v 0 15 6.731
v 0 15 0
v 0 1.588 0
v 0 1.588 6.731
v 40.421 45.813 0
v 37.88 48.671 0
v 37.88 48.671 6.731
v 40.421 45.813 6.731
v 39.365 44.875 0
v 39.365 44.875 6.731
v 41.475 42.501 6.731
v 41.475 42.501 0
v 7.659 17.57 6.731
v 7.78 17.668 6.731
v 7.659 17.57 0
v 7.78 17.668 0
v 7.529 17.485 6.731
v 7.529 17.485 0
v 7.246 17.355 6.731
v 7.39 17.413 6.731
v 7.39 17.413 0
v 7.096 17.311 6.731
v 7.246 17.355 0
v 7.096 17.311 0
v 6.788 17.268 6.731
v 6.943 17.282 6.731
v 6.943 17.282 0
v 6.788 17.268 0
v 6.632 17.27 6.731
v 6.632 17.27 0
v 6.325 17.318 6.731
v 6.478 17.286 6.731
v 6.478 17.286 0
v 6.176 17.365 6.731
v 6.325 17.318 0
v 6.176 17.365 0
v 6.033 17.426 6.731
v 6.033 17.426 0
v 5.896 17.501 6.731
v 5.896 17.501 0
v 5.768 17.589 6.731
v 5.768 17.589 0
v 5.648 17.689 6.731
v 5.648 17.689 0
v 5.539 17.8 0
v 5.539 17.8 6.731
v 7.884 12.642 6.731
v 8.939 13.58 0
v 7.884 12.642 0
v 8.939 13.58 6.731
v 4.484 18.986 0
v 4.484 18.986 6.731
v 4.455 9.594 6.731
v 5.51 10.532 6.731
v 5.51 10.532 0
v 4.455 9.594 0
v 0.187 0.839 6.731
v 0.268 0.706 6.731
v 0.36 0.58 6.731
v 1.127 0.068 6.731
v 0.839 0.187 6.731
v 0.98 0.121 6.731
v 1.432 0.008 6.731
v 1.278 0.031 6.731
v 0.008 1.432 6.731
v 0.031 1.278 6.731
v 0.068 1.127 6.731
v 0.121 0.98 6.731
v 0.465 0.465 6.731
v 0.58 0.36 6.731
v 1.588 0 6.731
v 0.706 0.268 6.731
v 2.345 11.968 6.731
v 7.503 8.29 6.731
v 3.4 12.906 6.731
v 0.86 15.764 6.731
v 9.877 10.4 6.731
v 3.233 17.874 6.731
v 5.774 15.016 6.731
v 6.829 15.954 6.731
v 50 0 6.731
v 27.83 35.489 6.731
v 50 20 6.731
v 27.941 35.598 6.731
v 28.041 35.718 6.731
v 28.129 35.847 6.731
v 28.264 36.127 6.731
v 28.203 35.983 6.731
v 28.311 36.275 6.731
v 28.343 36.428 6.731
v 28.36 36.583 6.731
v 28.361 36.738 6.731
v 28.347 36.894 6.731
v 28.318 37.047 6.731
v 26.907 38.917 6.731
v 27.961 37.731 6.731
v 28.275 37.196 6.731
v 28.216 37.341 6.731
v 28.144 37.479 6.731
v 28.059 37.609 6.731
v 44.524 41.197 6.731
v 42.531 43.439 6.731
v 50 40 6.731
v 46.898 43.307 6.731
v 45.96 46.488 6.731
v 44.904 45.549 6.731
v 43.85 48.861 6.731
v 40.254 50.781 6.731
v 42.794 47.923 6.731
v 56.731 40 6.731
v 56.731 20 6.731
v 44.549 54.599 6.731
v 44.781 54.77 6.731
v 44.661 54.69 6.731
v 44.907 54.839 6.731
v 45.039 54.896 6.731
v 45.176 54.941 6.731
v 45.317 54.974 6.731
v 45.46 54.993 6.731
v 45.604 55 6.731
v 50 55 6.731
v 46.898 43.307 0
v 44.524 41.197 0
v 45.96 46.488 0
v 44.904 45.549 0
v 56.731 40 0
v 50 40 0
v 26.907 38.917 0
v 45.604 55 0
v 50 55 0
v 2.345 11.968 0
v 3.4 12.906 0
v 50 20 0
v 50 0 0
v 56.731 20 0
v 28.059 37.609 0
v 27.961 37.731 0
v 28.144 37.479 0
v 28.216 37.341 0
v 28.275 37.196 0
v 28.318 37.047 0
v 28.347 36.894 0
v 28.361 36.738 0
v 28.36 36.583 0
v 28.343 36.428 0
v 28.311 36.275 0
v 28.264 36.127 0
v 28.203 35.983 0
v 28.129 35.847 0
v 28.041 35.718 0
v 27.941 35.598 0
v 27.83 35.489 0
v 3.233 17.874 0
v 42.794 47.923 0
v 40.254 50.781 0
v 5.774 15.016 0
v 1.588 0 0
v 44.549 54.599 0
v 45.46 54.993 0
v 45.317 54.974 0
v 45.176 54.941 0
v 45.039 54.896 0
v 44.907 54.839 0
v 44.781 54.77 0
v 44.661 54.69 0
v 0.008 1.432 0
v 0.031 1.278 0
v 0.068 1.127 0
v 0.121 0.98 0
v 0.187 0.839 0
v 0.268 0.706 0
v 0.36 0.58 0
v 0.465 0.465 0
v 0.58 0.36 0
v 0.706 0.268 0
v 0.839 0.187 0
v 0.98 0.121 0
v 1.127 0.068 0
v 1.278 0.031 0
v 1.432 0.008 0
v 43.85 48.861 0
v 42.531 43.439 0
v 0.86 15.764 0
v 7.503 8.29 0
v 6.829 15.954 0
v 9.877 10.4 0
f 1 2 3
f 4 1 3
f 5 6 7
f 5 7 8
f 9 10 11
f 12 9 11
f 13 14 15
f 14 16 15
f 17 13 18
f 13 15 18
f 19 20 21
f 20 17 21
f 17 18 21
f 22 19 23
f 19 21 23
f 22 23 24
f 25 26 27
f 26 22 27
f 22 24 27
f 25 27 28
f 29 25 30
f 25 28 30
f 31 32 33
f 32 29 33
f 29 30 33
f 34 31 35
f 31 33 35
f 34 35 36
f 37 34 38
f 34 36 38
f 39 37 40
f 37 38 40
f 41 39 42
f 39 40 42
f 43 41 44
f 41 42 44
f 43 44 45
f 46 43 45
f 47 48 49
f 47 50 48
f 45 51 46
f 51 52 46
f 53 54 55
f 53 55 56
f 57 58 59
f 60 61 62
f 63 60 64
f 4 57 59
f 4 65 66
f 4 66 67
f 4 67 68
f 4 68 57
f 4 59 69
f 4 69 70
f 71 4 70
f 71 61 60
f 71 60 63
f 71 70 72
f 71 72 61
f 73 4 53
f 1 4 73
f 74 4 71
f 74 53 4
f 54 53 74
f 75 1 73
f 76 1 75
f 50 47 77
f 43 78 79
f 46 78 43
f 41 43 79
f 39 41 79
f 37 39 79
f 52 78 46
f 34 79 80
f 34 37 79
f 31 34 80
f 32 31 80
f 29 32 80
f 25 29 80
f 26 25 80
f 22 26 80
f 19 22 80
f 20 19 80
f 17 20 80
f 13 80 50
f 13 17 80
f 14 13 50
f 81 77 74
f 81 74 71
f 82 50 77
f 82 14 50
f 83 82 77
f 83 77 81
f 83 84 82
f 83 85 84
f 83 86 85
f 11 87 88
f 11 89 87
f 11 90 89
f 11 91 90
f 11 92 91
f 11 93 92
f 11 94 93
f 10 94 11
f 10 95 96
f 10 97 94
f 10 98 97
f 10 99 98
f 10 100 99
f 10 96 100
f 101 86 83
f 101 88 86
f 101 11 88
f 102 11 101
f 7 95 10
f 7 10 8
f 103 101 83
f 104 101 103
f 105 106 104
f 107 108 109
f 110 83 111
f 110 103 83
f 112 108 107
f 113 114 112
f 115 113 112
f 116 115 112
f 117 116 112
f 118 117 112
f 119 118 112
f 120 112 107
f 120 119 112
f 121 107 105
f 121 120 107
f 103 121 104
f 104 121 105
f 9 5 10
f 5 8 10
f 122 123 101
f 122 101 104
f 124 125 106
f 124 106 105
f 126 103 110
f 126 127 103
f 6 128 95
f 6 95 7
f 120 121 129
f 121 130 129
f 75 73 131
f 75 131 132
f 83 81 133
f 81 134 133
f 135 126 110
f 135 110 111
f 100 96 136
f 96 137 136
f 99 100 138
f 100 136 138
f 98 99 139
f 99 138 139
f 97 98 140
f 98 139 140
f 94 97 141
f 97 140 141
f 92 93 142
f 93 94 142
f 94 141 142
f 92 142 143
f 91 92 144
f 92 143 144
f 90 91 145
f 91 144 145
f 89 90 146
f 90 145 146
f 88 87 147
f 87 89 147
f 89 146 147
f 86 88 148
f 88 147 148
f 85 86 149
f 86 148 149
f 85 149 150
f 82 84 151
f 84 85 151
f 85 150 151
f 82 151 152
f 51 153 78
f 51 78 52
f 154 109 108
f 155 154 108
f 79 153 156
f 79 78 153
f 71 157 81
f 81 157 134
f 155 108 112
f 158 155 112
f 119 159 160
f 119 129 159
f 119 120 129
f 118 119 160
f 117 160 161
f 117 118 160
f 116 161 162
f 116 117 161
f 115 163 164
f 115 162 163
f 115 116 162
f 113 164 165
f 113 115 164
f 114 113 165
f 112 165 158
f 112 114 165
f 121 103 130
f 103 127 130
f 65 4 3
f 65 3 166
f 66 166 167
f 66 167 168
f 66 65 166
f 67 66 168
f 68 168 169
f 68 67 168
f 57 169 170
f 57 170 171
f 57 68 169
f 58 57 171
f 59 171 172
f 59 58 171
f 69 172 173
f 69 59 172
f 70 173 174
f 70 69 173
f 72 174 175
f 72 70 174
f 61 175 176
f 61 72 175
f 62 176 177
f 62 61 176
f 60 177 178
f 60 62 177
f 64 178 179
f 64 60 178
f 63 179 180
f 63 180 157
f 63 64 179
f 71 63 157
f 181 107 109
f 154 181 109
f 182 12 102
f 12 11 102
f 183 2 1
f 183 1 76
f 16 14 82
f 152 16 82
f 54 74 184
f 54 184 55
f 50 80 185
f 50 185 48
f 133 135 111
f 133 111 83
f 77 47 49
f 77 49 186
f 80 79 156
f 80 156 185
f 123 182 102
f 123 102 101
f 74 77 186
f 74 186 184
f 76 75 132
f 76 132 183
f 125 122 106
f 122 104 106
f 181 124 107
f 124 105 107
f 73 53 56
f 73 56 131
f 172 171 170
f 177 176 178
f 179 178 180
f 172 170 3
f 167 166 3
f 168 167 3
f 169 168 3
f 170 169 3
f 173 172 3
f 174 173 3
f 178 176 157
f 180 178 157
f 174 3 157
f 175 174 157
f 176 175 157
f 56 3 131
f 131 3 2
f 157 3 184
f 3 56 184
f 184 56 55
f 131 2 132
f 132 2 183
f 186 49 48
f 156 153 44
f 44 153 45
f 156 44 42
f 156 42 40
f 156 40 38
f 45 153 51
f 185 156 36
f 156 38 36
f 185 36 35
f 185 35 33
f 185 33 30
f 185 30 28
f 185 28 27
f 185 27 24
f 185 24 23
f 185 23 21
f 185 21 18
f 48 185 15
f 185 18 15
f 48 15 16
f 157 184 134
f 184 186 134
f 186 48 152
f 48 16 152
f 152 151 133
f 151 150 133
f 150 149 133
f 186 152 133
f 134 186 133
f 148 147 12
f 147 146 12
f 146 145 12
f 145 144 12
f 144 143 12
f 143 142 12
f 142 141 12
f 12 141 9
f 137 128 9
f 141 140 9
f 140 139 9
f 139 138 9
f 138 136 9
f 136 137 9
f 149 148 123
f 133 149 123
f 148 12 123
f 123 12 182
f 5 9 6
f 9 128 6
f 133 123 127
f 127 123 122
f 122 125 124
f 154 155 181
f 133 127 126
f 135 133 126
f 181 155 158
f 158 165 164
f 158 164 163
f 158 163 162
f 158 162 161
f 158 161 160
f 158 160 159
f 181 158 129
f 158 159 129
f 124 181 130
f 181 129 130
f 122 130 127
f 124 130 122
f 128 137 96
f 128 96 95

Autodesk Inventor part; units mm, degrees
ref_plane "YZ Plane" through (0, 0, 0) normal (1, 0, 0) x (0, 1, 0)
ref_plane "XZ Plane" through (0, 0, 0) normal (0, 1, 0) x (-1, 0, 0)
ref_plane "XY Plane" through (0, 0, 0) normal (0, 0, 1) x (1, 0, 0)
sketch "Sketch1" plane through (0, 0, 0) normal (0, 0, 1) x (1, 0, 0)
  line L0 (0, 0) -> (50, 0)
  line L1 (50, 0) -> (50, 40)
  line L2 (50, 40) -> (56.731, 40)
  line L3 (56.731, 40) -> (56.731, 20)
  line L4 (56.731, 20) -> (50, 20)
  line L5 (50, 20) -> (50, 40)
  line L6 (10, 3.269) -> (30, 3.269)
  line L7 (30, 3.269) -> (30, 10)
  line L8 (30, 10) -> (10, 10)
  line L9 (10, 10) -> (10, 3.269)
  line L10 (0, 10) -> (10, 10)
  line L11 (30, 10) -> (50, 10)
  line L12 (0, 10) -> (0, 0)
  line L13 (0, 10) -> (0, 15)
  line L14 (0, 15) -> (45, 55)
  line L15 (50, 40) -> (50, 55)
  line L16 (50, 55) -> (45, 55)
  point P0 (20, 3.269)
  point P1 (20, 0)
  dimension "d2" = 20
  dimension "d3" = 20
  dimension "d5" = 6.731
  dimension "d6" = 10
  dimension "d9" = 10
  dimension "d11" = 20
  dimension "d12" = 20
  dimension "d14" = 5
  dimension "d16" = 15
  dimension "d17" = 5
extrude "Extrusion1" add sketch "Sketch1" along normal blind 6.731
sketch "Sketch2" plane through (0, 0, 6.731) normal (0, 0, 1) x (1, 0, 0)
  line L0 (45, 55) -> (0, 15) projected
  line L1 (4.4845, 18.9862) -> (6.5938, 16.6132)
  line L2 (6.5938, 16.6132) -> (29.0161, 36.5441)
  line L3 (29.0161, 36.5441) -> (26.9067, 38.9171)
  dimension "d18" = 3.175
  dimension "d19" = 30
  dimension "d20" = 6
extrude "Extrusion2" cut sketch "Sketch2" against normal up to next
fillet "Fillet1" radius 1.5875 4 edges at (45, 55, 3.3655) (0, 0, 3.3655) (6.5938, 16.6132, 3.3655) (29.0161, 36.5441, 3.3655)
sketch "Sketch3" plane through (0, 0, 6.731) normal (0, 0, 1) x (1, 0, 0)
  line L0 (45, 55) -> (0, 15) projected
  line L1 (3.2333, 17.874) -> (5.7738, 15.0159)
  line L2 (5.7738, 15.0159) -> (6.8292, 15.954)
  line L3 (6.8292, 15.954) -> (8.9392, 13.5803)
  line L4 (8.9392, 13.5803) -> (7.8838, 12.6422)
  line L5 (7.8838, 12.6422) -> (9.8769, 10.3999)
  line L6 (9.8769, 10.3999) -> (7.5032, 8.2899)
  line L7 (7.5032, 8.2899) -> (5.5101, 10.5322)
  line L8 (5.5101, 10.5322) -> (4.4547, 9.5941)
  line L9 (4.4547, 9.5941) -> (2.3447, 11.9678)
  line L10 (2.3447, 11.9678) -> (3.4, 12.9059)
  line L11 (3.4, 12.9059) -> (0.8595, 15.764)
  line L12 (37.8802, 48.6713) -> (40.4207, 45.8132)
  line L13 (40.4207, 45.8132) -> (39.3654, 44.8751)
  line L14 (39.3654, 44.8751) -> (41.4754, 42.5013)
  line L15 (41.4754, 42.5013) -> (42.5307, 43.4394)
  line L16 (42.5307, 43.4394) -> (44.5238, 41.1972)
  line L17 (44.5238, 41.1972) -> (46.8976, 43.3072)
  line L18 (46.8976, 43.3072) -> (44.9045, 45.5494)
  line L19 (44.9045, 45.5494) -> (45.9598, 46.4875)
  line L20 (45.9598, 46.4875) -> (43.8498, 48.8613)
  line L21 (43.8498, 48.8613) -> (42.7945, 47.9232)
  line L22 (42.7945, 47.9232) -> (40.254, 50.7813)
  dimension "d24" = 3.176
  dimension "d25" = 10
  dimension "d26" = 3
  dimension "d27" = 6
  dimension "d28" = 1.15
  dimension "d29" = 6.35
extrude "Extrusion3" cut sketch "Sketch3" against normal up to next
equation "\"d5\" = THICKB"
equation "\"d7\" = THICKB"
equation "\"THICKA\" = 3.175"
equation "\"THICKB\" = 6.731"
equation "\"THICKC\" = 12.7"
equation "\"THICKPLY\" = 5"
equation "\"MAGDIA\" = 9.5"
equation "\"BALLDIA\" = 12"
properties part number "Mount_LCD_End_SD"
